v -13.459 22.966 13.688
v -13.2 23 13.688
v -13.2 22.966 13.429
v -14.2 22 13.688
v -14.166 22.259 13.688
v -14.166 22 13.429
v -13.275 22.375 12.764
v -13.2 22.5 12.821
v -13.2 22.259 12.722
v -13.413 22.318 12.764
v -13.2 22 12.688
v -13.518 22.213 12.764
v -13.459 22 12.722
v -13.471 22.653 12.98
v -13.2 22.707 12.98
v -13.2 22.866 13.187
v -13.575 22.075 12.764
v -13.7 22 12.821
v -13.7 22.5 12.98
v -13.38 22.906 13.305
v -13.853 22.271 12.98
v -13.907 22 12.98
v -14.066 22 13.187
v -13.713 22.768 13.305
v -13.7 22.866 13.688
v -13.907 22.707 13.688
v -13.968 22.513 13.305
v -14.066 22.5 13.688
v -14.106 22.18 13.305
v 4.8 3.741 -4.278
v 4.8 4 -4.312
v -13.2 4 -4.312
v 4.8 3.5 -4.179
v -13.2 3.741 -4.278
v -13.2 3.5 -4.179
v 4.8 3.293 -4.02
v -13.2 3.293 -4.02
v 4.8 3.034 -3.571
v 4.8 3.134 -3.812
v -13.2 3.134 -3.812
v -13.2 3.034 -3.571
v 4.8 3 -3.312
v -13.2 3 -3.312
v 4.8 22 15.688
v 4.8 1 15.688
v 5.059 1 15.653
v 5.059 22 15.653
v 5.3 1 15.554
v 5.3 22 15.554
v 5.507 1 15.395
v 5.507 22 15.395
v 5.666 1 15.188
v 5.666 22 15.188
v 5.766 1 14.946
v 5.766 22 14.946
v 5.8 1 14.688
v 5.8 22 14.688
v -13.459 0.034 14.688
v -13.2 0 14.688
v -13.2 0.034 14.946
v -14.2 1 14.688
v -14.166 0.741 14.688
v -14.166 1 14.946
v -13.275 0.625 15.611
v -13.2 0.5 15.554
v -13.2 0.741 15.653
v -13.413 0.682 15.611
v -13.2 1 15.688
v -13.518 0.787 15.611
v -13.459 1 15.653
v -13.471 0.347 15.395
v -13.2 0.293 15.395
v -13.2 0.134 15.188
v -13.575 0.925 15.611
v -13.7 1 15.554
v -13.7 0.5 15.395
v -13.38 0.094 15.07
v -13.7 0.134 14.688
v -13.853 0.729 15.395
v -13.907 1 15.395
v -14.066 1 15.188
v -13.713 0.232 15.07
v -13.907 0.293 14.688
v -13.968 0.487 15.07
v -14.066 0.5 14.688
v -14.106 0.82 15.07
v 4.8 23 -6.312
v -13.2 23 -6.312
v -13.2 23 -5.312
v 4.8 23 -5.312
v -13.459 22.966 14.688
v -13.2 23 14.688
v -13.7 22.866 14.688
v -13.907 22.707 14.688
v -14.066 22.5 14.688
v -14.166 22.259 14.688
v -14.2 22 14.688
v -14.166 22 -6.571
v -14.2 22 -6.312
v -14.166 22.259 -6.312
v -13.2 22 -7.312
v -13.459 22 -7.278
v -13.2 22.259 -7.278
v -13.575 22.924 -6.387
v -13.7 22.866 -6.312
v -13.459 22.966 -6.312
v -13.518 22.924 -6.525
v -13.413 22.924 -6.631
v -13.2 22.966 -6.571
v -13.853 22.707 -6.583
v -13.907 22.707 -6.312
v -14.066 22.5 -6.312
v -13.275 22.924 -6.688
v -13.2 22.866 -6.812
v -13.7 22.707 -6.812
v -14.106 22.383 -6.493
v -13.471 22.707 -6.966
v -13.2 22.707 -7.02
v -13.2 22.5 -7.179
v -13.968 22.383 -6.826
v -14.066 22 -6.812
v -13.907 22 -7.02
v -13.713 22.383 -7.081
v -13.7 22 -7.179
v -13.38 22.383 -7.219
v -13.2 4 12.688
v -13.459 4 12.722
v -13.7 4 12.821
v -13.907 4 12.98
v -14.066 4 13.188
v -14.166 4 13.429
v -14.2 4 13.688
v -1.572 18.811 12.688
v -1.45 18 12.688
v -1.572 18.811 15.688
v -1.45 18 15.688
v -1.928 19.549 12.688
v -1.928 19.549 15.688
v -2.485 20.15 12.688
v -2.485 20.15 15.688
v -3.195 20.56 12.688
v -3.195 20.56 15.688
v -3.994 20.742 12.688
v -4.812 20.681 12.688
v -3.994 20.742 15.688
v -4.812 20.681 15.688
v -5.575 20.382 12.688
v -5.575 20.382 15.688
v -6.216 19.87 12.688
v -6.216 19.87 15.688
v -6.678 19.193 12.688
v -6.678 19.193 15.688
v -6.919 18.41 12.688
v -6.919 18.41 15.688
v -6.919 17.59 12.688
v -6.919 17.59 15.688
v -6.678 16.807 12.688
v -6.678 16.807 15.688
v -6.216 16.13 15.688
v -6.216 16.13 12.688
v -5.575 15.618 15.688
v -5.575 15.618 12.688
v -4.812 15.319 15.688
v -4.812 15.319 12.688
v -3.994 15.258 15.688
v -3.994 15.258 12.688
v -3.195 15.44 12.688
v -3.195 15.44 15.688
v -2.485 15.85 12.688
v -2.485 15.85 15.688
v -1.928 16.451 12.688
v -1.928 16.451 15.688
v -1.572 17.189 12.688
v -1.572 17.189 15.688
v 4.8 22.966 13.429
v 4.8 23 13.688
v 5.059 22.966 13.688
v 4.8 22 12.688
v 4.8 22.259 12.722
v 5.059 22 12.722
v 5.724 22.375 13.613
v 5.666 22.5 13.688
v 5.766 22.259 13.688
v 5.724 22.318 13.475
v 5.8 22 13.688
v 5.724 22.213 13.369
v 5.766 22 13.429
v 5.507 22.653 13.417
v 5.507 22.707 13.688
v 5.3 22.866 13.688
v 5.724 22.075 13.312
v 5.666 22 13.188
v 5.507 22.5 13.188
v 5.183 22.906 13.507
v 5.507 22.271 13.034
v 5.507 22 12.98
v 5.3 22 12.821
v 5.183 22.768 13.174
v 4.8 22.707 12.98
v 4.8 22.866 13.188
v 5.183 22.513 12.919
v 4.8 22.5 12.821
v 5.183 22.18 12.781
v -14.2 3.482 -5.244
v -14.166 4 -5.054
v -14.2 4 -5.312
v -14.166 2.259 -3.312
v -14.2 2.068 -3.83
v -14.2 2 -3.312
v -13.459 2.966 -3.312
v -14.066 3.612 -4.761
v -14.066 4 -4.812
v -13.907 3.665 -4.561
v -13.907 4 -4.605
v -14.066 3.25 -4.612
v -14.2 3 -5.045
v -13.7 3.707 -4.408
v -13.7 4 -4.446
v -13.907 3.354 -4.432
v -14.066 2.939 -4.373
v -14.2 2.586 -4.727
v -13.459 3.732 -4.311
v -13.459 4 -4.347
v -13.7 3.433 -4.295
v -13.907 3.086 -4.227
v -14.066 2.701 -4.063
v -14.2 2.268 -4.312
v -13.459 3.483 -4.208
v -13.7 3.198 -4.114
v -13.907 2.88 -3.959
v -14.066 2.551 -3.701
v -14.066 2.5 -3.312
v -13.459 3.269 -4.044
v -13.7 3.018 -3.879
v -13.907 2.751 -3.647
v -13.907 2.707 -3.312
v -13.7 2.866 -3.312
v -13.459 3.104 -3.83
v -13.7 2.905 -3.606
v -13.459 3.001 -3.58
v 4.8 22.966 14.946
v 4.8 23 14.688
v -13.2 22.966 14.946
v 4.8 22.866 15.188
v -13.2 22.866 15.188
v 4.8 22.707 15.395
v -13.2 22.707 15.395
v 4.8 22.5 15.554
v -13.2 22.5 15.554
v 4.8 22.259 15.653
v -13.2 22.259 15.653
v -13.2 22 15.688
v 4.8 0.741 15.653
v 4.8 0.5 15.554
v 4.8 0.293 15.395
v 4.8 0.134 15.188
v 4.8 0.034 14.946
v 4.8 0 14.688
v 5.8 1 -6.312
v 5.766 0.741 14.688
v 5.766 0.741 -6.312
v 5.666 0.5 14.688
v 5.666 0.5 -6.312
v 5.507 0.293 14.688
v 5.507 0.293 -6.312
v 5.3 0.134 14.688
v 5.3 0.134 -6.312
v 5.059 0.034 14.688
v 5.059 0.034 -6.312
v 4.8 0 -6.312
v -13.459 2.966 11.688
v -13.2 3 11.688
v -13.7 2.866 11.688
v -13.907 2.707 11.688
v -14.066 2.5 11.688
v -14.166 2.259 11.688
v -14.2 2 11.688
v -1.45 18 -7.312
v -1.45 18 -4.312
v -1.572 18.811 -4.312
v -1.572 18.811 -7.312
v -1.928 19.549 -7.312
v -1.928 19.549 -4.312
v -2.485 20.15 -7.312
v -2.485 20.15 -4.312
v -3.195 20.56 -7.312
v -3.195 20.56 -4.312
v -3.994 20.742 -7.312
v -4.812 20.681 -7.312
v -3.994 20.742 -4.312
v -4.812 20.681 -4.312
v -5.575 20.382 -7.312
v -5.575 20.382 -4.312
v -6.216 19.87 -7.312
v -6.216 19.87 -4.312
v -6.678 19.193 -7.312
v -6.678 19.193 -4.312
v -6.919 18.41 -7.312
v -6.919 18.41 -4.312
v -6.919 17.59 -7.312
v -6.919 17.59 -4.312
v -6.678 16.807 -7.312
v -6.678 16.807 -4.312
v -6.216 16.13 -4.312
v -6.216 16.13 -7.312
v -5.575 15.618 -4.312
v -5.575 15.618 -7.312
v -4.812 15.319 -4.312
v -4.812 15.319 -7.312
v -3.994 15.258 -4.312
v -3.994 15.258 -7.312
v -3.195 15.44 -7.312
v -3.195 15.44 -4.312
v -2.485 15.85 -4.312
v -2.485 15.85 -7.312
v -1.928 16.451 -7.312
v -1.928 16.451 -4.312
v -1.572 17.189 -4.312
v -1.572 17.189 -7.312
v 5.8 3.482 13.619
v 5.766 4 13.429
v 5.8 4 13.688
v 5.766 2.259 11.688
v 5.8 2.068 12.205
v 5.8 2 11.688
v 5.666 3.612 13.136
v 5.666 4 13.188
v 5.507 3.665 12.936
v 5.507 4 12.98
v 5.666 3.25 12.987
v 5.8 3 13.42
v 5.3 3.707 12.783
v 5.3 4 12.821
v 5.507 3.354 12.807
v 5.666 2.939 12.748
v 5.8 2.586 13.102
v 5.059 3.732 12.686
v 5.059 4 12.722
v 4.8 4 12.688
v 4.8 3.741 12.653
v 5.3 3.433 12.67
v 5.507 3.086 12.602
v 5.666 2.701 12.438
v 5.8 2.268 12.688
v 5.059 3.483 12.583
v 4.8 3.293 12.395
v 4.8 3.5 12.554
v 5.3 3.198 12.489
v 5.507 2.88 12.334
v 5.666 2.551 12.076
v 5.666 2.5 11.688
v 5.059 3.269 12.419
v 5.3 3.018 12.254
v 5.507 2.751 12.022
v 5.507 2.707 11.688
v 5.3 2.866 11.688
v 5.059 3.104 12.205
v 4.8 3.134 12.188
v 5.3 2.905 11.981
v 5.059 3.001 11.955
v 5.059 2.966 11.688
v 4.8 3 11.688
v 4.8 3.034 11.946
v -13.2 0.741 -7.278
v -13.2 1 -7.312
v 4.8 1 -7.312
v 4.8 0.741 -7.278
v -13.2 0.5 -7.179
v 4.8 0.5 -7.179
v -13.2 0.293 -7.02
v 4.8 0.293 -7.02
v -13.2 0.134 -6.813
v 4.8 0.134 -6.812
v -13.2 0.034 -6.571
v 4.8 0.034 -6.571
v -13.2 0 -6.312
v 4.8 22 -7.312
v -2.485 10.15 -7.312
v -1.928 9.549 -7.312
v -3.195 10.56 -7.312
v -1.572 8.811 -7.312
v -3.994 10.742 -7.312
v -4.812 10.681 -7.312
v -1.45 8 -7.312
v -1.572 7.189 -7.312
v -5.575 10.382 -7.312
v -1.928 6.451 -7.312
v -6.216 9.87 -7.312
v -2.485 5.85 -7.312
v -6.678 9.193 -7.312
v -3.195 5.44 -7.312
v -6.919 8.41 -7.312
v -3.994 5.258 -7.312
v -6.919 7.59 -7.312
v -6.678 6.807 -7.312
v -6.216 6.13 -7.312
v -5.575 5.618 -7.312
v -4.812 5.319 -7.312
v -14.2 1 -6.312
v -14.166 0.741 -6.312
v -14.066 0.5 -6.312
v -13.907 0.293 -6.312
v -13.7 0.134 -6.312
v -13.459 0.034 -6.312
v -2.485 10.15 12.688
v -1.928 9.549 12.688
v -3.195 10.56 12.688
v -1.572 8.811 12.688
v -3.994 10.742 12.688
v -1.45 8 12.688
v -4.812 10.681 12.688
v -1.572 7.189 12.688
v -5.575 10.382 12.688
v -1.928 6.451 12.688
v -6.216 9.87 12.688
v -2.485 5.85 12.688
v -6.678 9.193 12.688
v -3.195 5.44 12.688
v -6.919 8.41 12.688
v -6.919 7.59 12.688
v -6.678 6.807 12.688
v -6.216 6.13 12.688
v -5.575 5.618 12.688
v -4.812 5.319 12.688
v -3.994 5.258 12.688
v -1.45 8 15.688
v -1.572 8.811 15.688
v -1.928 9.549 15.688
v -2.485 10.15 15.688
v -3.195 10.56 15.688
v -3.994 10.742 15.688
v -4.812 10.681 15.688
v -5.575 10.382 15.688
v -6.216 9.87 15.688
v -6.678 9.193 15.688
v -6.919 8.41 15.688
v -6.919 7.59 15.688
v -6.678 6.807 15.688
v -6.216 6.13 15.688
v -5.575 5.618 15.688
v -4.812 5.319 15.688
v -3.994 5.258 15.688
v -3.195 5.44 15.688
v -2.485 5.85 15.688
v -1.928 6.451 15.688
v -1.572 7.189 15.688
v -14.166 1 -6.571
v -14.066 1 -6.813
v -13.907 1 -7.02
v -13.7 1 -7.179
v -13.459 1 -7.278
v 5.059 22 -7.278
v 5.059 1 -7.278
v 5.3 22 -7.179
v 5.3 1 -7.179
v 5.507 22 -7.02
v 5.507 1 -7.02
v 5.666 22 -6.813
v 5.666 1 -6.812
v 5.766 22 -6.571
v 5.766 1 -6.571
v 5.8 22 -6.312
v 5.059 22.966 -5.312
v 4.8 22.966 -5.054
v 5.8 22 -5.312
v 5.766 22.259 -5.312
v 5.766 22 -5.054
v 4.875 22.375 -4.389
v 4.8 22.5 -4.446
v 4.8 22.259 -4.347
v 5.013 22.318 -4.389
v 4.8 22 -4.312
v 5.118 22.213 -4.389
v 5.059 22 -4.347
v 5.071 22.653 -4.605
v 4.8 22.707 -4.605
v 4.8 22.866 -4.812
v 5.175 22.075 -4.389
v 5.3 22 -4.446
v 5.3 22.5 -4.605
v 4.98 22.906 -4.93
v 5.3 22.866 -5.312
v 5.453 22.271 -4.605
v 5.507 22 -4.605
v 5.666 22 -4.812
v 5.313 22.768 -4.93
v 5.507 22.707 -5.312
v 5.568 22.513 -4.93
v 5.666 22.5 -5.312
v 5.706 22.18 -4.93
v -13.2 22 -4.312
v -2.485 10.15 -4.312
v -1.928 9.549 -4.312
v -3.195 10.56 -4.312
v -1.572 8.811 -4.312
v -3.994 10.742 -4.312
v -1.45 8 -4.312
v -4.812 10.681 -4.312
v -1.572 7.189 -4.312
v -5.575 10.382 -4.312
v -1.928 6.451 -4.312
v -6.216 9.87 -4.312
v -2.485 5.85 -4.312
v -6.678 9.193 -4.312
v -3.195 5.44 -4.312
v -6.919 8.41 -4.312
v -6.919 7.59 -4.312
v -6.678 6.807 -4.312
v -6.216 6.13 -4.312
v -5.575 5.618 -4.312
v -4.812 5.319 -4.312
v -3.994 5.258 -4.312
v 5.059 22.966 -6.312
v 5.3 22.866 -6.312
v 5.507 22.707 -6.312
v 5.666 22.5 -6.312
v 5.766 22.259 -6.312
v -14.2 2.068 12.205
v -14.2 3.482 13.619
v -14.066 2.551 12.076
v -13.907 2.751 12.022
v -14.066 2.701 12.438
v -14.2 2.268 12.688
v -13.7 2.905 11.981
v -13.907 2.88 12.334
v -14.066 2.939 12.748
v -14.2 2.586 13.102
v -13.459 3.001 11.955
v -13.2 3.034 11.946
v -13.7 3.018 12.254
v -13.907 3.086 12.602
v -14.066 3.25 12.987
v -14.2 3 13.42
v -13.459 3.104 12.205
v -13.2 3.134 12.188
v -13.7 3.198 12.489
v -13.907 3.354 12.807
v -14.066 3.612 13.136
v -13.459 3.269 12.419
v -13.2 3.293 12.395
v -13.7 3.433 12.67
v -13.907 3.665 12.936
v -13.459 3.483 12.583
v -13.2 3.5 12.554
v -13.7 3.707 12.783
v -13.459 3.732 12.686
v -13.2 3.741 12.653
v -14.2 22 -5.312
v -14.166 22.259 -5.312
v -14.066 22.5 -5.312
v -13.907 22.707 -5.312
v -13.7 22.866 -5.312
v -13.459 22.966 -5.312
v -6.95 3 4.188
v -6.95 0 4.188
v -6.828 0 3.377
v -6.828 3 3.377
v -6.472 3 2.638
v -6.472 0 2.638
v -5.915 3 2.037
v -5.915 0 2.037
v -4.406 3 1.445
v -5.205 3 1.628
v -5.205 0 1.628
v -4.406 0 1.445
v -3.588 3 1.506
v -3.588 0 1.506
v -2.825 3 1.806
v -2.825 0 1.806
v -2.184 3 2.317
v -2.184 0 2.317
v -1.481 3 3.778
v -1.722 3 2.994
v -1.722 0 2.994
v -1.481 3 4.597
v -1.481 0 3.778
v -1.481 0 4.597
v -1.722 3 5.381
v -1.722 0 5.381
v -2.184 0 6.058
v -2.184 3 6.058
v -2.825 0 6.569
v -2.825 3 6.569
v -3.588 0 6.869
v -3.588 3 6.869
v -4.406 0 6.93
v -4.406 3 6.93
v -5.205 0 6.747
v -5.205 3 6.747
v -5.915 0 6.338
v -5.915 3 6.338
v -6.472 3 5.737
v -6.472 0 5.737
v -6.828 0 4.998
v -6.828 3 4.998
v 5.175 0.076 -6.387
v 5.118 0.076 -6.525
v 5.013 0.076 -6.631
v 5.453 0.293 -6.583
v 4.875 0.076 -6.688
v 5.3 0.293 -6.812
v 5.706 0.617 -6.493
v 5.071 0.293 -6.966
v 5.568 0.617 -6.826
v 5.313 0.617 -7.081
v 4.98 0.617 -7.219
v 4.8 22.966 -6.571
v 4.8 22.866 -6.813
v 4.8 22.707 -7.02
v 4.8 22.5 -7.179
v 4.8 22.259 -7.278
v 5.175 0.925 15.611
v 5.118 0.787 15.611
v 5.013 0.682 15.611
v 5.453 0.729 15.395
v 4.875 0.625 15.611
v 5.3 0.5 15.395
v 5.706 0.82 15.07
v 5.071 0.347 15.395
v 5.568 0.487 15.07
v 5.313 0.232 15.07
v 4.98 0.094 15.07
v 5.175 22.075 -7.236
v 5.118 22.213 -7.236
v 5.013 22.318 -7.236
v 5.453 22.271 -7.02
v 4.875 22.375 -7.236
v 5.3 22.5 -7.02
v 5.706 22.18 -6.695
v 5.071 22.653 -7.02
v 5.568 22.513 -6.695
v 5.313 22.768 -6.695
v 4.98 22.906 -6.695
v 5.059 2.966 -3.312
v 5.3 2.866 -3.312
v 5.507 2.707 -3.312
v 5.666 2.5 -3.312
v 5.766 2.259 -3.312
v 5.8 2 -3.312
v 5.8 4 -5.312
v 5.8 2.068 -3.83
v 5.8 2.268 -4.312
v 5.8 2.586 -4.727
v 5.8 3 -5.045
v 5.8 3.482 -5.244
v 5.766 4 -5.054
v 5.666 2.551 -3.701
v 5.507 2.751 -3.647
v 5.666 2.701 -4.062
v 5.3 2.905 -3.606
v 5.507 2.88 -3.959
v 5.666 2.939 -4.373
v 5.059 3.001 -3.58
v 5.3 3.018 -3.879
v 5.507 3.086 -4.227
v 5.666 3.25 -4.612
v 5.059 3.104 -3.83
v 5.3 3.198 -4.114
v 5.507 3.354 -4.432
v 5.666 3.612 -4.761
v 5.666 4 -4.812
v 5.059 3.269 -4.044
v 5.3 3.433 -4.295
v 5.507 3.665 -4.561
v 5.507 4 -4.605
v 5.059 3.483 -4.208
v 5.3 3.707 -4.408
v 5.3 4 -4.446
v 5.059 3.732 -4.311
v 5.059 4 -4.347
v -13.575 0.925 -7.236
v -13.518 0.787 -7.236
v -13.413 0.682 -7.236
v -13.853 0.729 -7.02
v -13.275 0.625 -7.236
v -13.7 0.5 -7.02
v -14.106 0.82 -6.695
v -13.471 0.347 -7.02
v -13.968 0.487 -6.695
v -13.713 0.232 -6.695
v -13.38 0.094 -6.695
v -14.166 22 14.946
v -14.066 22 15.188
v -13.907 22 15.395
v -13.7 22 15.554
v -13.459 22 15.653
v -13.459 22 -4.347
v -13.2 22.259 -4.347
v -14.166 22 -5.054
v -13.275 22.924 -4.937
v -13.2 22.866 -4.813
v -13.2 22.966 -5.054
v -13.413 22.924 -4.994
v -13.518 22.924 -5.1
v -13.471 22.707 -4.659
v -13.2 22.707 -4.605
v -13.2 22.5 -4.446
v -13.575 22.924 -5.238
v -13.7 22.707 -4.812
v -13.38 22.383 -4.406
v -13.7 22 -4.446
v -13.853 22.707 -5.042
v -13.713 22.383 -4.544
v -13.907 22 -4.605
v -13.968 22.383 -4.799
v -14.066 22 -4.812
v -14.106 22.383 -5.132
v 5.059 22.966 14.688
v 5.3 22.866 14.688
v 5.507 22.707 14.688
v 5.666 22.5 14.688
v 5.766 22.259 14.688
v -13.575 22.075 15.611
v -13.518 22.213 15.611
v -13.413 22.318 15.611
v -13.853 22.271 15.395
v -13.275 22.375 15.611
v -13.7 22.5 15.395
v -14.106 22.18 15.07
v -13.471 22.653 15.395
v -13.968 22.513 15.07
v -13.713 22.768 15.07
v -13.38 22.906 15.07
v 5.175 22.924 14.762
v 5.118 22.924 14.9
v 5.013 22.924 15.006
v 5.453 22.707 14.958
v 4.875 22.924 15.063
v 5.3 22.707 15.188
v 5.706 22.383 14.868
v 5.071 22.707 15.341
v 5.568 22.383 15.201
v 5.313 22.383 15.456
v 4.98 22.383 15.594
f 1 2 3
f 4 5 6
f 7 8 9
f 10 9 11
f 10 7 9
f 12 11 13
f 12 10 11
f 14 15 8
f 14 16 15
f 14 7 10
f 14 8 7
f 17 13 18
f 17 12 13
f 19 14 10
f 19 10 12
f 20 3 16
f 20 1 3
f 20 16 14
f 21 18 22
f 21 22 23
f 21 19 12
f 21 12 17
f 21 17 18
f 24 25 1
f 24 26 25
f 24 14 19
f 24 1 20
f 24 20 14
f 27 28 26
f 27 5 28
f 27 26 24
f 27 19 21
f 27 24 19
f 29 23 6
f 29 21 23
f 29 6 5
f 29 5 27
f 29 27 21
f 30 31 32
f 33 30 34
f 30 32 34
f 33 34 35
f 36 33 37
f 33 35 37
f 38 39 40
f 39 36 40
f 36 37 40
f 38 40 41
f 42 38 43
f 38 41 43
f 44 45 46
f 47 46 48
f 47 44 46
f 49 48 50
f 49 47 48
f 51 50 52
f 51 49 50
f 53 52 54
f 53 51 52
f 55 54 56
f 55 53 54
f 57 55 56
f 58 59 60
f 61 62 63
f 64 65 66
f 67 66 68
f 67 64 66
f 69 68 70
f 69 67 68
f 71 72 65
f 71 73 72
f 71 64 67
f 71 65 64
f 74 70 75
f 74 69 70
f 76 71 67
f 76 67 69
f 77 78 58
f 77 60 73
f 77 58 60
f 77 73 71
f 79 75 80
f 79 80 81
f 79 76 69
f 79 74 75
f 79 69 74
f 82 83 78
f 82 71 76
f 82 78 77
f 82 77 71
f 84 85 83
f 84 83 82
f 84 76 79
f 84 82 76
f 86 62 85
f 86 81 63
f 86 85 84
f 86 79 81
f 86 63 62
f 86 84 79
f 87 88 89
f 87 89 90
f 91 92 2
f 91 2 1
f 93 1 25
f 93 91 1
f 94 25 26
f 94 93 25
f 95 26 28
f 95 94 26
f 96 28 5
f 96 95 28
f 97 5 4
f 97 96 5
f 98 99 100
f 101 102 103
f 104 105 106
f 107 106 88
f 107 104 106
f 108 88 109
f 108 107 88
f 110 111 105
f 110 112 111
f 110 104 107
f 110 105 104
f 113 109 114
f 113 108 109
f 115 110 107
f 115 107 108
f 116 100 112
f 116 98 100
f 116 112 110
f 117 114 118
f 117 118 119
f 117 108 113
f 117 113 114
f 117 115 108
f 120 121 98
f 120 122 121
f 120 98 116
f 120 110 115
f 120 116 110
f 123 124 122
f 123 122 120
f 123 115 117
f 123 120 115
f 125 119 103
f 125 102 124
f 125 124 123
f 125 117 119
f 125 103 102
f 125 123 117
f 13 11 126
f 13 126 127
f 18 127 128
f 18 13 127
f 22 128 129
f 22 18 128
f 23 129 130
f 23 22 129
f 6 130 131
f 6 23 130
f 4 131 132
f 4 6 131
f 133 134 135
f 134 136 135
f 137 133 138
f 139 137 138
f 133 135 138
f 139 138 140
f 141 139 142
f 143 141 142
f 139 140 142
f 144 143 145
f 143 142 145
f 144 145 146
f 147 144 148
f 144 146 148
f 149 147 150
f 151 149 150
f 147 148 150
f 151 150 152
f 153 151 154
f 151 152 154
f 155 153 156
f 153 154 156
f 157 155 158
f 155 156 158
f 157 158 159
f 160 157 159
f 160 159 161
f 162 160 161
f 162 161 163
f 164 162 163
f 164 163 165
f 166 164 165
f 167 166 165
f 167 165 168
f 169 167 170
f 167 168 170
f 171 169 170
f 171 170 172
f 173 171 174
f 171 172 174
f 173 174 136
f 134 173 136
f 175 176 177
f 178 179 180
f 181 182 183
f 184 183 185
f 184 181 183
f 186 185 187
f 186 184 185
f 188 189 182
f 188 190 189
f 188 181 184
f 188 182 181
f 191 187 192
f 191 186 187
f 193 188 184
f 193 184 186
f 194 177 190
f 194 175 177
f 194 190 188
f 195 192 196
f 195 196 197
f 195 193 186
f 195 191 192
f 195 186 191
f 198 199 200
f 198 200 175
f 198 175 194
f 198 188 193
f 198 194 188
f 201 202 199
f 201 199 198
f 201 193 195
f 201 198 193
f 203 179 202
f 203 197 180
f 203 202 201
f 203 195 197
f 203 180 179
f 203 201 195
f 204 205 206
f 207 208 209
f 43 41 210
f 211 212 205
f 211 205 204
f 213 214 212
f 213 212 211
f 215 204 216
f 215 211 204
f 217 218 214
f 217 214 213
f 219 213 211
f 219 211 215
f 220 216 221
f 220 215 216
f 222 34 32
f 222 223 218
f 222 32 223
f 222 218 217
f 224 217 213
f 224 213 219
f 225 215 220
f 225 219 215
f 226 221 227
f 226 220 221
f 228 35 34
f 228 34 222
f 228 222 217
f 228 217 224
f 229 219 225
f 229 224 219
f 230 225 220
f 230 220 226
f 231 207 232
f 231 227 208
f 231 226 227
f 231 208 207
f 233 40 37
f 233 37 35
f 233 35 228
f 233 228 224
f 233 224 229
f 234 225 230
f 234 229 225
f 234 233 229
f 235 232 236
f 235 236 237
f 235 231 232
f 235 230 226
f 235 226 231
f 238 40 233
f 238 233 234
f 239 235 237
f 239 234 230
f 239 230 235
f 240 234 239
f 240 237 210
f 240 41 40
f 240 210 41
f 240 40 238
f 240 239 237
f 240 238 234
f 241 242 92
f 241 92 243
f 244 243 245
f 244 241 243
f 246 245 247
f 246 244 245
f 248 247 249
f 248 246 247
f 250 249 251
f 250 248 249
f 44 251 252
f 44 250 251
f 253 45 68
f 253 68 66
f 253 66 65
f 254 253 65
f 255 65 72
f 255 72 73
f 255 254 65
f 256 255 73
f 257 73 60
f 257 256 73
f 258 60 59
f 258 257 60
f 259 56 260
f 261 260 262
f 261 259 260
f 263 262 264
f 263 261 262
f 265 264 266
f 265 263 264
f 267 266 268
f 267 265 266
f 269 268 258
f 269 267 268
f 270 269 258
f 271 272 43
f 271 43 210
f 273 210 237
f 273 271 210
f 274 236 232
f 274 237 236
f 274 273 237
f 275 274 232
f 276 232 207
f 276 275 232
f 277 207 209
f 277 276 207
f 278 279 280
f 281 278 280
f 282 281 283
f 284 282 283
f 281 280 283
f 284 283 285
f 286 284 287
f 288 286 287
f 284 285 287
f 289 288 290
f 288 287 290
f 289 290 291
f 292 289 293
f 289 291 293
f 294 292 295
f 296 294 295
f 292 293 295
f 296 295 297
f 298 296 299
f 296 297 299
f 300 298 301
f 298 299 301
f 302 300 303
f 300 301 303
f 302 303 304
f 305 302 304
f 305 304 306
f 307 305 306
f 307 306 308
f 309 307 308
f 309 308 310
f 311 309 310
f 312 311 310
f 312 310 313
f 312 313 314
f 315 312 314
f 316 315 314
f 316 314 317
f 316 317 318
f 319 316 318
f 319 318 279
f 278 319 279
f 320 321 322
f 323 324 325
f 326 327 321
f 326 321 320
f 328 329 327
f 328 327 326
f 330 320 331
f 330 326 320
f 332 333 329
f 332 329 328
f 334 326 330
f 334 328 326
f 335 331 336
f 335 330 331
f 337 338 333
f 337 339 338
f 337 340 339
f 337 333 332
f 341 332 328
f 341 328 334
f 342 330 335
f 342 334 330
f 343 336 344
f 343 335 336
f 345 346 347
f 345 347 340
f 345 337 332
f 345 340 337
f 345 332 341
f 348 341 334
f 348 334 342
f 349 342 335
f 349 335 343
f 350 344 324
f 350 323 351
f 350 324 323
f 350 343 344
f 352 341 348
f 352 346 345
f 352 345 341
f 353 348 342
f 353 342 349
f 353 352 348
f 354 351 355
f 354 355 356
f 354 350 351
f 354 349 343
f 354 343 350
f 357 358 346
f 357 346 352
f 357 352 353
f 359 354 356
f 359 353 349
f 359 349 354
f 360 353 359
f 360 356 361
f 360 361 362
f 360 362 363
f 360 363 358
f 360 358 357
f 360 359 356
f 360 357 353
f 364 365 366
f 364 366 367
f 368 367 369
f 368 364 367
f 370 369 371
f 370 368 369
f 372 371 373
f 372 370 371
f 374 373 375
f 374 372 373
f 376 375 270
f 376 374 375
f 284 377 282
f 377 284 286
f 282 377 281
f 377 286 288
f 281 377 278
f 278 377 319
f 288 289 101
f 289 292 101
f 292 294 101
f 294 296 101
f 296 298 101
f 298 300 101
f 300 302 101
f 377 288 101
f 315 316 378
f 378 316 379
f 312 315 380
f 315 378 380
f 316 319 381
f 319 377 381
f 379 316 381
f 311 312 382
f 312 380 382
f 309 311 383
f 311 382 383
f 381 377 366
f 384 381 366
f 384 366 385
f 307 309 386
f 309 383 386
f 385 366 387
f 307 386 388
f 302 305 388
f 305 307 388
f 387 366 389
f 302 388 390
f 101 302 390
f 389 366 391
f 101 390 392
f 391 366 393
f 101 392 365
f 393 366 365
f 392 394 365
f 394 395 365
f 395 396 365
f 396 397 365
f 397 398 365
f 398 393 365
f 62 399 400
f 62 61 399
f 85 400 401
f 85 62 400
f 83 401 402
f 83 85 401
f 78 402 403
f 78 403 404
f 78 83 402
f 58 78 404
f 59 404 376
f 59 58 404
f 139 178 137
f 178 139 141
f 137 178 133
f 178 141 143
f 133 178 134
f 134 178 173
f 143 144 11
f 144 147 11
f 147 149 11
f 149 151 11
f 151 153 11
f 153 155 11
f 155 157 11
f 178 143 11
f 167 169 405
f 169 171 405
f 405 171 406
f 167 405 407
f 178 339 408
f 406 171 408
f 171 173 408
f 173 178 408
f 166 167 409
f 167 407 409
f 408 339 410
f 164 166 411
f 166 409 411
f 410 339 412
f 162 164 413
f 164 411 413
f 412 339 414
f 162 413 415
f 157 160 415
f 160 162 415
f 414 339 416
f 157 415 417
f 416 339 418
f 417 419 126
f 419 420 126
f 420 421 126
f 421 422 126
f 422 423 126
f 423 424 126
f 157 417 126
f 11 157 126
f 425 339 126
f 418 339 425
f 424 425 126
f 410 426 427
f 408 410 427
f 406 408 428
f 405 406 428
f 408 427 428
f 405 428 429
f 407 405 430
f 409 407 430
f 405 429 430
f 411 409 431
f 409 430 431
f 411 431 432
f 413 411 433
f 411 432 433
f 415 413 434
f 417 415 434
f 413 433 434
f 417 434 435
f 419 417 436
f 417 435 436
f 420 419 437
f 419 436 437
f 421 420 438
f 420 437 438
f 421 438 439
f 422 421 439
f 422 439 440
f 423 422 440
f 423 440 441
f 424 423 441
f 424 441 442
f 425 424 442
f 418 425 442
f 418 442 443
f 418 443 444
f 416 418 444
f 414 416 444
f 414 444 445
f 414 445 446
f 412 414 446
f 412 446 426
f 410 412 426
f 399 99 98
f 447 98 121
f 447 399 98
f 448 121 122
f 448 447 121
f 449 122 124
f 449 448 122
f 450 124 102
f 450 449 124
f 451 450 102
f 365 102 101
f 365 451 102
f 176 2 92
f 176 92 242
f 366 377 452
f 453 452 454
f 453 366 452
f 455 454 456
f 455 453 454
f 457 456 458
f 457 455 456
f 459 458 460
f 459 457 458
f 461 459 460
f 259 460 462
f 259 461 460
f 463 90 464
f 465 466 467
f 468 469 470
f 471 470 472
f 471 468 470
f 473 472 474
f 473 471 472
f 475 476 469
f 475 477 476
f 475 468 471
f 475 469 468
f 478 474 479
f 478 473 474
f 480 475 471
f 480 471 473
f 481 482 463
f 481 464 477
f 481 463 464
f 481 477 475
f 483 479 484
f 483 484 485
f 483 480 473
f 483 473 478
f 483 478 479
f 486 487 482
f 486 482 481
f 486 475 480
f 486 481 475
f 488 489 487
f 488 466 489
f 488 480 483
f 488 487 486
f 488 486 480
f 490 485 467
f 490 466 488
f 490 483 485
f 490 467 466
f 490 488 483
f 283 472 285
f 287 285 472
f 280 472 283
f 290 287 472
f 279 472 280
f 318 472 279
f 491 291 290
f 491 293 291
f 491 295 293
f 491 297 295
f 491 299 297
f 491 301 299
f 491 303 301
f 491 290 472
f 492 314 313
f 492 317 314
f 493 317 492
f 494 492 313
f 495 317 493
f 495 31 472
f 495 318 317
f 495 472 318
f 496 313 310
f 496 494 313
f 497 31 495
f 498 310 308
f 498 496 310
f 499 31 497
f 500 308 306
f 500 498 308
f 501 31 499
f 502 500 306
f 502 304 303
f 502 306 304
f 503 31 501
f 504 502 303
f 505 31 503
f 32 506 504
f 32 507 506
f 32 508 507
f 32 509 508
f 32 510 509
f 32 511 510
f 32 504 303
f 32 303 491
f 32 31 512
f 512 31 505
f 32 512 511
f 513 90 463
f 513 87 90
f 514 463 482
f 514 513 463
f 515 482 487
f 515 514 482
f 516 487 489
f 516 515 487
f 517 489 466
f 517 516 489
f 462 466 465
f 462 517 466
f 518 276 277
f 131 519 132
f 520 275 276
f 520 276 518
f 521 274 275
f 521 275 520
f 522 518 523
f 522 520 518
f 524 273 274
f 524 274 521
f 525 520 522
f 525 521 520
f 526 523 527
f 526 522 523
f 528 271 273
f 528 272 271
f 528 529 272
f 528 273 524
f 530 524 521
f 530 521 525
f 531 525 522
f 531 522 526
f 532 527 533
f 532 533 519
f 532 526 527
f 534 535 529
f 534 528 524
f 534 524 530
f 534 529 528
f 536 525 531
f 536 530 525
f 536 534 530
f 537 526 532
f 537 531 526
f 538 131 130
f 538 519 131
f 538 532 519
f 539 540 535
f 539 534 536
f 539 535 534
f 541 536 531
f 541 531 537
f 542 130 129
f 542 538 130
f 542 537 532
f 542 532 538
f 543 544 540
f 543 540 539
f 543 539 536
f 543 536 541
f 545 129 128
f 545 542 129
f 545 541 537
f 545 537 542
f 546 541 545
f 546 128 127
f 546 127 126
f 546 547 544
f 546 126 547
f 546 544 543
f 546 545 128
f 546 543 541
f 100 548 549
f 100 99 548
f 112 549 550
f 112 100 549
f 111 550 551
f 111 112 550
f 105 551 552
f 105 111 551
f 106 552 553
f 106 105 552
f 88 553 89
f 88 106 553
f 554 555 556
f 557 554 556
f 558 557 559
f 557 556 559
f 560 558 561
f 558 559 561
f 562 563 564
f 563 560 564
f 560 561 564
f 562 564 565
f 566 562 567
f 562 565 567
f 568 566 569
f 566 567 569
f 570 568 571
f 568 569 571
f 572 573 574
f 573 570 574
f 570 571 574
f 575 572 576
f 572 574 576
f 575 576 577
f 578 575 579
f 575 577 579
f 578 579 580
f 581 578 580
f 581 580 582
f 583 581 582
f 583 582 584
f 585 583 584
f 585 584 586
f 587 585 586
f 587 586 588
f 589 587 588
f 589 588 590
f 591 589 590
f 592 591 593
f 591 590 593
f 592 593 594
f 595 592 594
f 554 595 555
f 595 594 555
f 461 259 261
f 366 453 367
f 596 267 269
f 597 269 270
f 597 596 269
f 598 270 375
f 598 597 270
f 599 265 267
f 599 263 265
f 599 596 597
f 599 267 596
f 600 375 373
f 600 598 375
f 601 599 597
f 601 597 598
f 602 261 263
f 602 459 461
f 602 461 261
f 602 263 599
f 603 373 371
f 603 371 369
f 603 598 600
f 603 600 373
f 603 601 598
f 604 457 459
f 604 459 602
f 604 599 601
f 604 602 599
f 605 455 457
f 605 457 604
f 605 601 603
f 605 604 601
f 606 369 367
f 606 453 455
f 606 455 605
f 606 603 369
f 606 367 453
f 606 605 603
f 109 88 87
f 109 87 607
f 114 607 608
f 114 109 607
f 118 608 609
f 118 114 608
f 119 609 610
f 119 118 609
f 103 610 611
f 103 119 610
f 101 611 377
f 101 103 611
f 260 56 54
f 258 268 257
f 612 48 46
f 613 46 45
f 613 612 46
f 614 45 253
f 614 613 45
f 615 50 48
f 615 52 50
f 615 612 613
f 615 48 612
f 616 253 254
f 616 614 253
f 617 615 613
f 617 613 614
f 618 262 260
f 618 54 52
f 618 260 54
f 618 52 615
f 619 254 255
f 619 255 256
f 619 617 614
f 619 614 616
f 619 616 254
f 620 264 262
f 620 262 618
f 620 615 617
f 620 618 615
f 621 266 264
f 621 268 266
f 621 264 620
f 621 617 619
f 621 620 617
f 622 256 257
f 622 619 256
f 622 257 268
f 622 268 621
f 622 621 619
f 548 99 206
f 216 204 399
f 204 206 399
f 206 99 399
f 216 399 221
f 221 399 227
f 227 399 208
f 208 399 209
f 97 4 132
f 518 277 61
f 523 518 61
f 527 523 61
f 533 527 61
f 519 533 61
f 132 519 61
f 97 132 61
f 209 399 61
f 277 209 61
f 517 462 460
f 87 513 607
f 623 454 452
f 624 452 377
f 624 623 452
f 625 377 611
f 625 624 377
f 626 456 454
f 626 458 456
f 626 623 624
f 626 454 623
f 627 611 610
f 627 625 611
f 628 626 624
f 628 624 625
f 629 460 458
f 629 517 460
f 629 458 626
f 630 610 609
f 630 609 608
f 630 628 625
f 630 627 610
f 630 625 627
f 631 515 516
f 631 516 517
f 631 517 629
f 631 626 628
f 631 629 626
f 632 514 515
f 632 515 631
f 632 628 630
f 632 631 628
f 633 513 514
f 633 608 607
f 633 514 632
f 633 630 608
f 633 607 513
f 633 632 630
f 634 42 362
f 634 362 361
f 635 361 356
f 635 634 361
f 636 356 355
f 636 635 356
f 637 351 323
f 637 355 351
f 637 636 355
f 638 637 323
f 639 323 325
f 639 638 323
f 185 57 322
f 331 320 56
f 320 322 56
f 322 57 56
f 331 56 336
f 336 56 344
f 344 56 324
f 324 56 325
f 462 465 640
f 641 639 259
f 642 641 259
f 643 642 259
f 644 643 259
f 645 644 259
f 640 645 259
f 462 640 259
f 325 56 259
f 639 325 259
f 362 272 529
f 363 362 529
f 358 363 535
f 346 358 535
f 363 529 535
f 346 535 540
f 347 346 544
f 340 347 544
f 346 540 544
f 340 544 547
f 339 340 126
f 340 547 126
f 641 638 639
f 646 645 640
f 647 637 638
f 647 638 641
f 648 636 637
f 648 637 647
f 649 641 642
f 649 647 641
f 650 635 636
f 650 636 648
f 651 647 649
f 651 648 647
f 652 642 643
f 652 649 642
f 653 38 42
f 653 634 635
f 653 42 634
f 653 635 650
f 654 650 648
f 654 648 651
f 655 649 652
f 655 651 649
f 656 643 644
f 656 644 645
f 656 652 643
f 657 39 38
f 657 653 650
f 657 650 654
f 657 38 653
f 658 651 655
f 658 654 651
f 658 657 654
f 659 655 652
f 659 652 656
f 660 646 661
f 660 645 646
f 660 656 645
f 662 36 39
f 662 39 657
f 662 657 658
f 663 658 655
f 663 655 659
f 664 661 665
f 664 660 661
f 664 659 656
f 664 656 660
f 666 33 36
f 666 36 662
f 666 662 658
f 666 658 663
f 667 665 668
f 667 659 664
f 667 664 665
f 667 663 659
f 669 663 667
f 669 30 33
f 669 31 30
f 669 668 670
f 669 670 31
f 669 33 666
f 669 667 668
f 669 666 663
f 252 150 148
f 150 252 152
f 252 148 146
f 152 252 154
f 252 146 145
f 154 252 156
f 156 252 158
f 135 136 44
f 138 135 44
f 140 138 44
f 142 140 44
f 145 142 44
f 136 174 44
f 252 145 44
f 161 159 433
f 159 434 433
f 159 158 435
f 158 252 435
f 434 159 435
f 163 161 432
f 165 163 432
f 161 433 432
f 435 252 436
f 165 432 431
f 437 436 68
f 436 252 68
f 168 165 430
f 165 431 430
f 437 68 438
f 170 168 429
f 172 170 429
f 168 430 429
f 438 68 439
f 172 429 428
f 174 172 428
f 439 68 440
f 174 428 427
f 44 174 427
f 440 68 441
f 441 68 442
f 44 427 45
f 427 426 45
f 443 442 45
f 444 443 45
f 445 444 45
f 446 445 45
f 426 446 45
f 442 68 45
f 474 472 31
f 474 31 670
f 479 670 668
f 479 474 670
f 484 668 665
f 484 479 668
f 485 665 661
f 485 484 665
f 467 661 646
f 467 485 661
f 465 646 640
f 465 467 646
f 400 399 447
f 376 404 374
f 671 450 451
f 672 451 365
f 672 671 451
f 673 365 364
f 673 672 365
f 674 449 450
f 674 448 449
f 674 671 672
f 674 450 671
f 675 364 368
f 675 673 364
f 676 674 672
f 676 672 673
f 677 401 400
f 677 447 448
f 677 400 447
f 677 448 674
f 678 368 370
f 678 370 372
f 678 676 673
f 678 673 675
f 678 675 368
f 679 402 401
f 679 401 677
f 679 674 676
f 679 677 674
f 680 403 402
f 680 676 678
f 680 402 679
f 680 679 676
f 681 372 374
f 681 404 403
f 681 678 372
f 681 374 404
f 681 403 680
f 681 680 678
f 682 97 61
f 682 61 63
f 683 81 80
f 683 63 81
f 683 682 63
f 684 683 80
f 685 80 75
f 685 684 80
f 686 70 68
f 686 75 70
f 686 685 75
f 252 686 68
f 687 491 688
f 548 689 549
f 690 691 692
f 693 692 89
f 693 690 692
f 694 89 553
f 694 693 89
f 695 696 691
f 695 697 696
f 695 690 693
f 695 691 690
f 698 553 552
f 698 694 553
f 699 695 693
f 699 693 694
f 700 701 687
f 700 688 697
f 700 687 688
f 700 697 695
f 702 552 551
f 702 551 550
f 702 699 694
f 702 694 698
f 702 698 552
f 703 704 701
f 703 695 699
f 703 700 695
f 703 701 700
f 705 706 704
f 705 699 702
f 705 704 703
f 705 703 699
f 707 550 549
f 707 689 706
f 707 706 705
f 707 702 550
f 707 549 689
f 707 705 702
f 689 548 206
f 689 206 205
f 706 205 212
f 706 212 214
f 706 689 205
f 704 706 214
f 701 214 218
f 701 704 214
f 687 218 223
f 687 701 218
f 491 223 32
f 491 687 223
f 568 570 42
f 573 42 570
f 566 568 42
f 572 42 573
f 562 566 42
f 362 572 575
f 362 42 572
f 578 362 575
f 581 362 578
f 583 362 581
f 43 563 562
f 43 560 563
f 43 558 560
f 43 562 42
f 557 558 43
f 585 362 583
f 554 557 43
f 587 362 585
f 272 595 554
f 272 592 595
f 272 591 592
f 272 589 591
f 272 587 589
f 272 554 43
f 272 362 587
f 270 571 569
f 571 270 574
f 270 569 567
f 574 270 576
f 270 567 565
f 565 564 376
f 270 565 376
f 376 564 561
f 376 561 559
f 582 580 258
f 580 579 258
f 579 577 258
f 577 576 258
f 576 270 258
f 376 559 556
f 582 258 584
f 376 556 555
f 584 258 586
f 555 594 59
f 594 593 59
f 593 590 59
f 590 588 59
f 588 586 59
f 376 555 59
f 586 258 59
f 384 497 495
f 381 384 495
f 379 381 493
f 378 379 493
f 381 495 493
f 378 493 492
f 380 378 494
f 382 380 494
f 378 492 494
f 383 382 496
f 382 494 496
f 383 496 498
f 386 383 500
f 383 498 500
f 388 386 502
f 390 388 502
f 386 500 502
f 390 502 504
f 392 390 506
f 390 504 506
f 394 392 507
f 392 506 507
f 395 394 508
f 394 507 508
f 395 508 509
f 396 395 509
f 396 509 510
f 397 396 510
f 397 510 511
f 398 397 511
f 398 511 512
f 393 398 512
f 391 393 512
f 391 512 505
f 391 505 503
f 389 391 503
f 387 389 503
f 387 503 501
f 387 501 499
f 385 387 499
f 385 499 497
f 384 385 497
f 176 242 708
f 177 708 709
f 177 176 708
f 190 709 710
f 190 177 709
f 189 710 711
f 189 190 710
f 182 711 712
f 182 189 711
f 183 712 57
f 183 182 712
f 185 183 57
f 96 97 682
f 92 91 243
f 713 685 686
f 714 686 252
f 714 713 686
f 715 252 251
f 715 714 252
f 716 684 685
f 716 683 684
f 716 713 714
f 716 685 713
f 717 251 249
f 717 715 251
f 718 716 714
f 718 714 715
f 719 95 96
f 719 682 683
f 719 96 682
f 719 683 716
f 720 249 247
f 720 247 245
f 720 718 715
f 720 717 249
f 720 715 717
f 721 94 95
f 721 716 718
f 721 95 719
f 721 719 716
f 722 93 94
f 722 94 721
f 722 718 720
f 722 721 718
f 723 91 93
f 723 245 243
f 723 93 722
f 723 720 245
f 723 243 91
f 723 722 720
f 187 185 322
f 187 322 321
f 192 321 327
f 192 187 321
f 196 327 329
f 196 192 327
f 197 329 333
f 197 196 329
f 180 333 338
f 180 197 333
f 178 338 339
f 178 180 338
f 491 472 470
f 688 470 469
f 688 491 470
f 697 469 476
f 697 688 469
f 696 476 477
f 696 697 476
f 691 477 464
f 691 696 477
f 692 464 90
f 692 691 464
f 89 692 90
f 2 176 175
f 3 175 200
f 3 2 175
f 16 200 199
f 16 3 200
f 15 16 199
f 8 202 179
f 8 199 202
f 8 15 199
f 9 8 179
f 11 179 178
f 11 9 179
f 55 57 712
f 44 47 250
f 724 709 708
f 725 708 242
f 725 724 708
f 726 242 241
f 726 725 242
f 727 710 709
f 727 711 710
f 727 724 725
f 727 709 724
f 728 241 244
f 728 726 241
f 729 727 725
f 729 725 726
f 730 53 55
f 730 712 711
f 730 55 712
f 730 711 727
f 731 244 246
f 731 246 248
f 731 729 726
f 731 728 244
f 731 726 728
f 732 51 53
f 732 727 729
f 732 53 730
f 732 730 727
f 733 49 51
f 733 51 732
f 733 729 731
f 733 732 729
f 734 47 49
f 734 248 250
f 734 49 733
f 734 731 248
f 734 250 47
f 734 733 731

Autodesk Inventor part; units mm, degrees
ref_plane "YZ Plane" through (0, 0, 0) normal (1, 0, 0) x (0, 1, 0)
ref_plane "XZ Plane" through (0, 0, 0) normal (0, 1, 0) x (-1, 0, 0)
ref_plane "XY Plane" through (0, 0, 0) normal (0, 0, 1) x (1, 0, 0)
sketch "Sketch1" plane through (0, 0, 0) normal (0, 1, 0) x (-1, 0, 0)
  line L0 (14.2, 15.6875) -> (-5.8, 15.6875)
  line L1 (-5.8, 15.6875) -> (-5.8, -7.3125)
  line L2 (-5.8, -7.3125) -> (14.2, -7.3125)
  line L3 (14.2, -7.3125) -> (14.2, 15.6875)
  circle A0 centre (4.2, 4.1875) radius 2.75
  point P0 (0, 0)
  dimension "d0" = 20
  dimension "d1" = 23
  dimension "d9" = 5.5
  dimension "d10" = 11.5
  dimension "d11" = 10
extrude "Extrusion2" add sketch "Sketch1" along normal blind 3
sketch "Sketch3" plane through (0, 3, 0) normal (0, 1, 0) x (1, 0, 0)
  line L0 (5.8, -15.6875) -> (5.8, 7.3125) projected
  line L1 (-14.2, -15.6875) -> (5.8, -15.6875) projected
  line L2 (5.8, -12.6875) -> (-14.2, -12.6875)
  line L3 (-14.2, -12.6875) -> (-14.2, -15.6875)
  line L4 (-14.2, -15.6875) -> (5.8, -15.6875)
  line L5 (5.8, -15.6875) -> (5.8, -12.6875)
  line L6 (5.8, 7.3125) -> (-14.2, 7.3125) projected
  line L7 (5.8, 4.3125) -> (-14.2, 4.3125)
  line L8 (-14.2, 4.3125) -> (-14.2, 7.3125)
  line L9 (-14.2, 7.3125) -> (5.8, 7.3125)
  line L10 (5.8, 7.3125) -> (5.8, 4.3125)
  point P0 (0, 0)
  dimension "d14" = 3
  dimension "d15" = 3
extrude "Extrusion3" add sketch "Sketch3" along normal blind 20
sketch "Sketch4" plane through (-14.2, 0, 15.6875) normal (0, 0, 1) x (1, 0, 0)
  circle A0 centre (10, 8) radius 2.75
  circle A1 centre (10, 18) radius 2.75
  line L0 (0, 0) -> (20, 0) projected
  line L1 (0, 23) -> (20, 23) projected
  line L2 (20, 0) -> (20, 23) projected
  line L3 (0, 3) -> (20, 3) projected
  point P0 (14.2, 0)
  dimension "d18" = 5.5
  dimension "d19" = 5.5
  dimension "d21" = 5
  dimension "d22" = 10
  dimension "d25" = 5
extrude "Extrusion4" cut sketch "Sketch4" against normal through all
fillet "Fillet1" radius 1 24 edges at (-14.2, 3, 4.1875) (-14.2, 13, -4.3125) (5.8, 3, 4.1875) (-14.2, 0, 4.1875) (-14.2, 11.5, -7.3125) (-14.2, 23, -5.8125) (5.8, 23, -5.8125) (-14.2, 23, 14.1875) (-4.2, 23, 12.6875) (-14.2, 13, 12.6875) (-4.2, 23, -4.3125) (-4.2, 23, -7.3125) (5.8, 13, -4.3125) (5.8, 11.5, -7.3125) (5.8, 0, 4.1875) (5.8, 11.5, 15.6875) (5.8, 13, 12.6875) (-4.2, 23, 15.6875) (5.8, 23, 14.1875) (-14.2, 11.5, 15.6875) (-4.2, 0, 15.6875) (-4.2, 0, -7.3125) (-4.2, 3, 12.6875) (-4.2, 3, -4.3125)
properties part number "top printhead screwplate2"
